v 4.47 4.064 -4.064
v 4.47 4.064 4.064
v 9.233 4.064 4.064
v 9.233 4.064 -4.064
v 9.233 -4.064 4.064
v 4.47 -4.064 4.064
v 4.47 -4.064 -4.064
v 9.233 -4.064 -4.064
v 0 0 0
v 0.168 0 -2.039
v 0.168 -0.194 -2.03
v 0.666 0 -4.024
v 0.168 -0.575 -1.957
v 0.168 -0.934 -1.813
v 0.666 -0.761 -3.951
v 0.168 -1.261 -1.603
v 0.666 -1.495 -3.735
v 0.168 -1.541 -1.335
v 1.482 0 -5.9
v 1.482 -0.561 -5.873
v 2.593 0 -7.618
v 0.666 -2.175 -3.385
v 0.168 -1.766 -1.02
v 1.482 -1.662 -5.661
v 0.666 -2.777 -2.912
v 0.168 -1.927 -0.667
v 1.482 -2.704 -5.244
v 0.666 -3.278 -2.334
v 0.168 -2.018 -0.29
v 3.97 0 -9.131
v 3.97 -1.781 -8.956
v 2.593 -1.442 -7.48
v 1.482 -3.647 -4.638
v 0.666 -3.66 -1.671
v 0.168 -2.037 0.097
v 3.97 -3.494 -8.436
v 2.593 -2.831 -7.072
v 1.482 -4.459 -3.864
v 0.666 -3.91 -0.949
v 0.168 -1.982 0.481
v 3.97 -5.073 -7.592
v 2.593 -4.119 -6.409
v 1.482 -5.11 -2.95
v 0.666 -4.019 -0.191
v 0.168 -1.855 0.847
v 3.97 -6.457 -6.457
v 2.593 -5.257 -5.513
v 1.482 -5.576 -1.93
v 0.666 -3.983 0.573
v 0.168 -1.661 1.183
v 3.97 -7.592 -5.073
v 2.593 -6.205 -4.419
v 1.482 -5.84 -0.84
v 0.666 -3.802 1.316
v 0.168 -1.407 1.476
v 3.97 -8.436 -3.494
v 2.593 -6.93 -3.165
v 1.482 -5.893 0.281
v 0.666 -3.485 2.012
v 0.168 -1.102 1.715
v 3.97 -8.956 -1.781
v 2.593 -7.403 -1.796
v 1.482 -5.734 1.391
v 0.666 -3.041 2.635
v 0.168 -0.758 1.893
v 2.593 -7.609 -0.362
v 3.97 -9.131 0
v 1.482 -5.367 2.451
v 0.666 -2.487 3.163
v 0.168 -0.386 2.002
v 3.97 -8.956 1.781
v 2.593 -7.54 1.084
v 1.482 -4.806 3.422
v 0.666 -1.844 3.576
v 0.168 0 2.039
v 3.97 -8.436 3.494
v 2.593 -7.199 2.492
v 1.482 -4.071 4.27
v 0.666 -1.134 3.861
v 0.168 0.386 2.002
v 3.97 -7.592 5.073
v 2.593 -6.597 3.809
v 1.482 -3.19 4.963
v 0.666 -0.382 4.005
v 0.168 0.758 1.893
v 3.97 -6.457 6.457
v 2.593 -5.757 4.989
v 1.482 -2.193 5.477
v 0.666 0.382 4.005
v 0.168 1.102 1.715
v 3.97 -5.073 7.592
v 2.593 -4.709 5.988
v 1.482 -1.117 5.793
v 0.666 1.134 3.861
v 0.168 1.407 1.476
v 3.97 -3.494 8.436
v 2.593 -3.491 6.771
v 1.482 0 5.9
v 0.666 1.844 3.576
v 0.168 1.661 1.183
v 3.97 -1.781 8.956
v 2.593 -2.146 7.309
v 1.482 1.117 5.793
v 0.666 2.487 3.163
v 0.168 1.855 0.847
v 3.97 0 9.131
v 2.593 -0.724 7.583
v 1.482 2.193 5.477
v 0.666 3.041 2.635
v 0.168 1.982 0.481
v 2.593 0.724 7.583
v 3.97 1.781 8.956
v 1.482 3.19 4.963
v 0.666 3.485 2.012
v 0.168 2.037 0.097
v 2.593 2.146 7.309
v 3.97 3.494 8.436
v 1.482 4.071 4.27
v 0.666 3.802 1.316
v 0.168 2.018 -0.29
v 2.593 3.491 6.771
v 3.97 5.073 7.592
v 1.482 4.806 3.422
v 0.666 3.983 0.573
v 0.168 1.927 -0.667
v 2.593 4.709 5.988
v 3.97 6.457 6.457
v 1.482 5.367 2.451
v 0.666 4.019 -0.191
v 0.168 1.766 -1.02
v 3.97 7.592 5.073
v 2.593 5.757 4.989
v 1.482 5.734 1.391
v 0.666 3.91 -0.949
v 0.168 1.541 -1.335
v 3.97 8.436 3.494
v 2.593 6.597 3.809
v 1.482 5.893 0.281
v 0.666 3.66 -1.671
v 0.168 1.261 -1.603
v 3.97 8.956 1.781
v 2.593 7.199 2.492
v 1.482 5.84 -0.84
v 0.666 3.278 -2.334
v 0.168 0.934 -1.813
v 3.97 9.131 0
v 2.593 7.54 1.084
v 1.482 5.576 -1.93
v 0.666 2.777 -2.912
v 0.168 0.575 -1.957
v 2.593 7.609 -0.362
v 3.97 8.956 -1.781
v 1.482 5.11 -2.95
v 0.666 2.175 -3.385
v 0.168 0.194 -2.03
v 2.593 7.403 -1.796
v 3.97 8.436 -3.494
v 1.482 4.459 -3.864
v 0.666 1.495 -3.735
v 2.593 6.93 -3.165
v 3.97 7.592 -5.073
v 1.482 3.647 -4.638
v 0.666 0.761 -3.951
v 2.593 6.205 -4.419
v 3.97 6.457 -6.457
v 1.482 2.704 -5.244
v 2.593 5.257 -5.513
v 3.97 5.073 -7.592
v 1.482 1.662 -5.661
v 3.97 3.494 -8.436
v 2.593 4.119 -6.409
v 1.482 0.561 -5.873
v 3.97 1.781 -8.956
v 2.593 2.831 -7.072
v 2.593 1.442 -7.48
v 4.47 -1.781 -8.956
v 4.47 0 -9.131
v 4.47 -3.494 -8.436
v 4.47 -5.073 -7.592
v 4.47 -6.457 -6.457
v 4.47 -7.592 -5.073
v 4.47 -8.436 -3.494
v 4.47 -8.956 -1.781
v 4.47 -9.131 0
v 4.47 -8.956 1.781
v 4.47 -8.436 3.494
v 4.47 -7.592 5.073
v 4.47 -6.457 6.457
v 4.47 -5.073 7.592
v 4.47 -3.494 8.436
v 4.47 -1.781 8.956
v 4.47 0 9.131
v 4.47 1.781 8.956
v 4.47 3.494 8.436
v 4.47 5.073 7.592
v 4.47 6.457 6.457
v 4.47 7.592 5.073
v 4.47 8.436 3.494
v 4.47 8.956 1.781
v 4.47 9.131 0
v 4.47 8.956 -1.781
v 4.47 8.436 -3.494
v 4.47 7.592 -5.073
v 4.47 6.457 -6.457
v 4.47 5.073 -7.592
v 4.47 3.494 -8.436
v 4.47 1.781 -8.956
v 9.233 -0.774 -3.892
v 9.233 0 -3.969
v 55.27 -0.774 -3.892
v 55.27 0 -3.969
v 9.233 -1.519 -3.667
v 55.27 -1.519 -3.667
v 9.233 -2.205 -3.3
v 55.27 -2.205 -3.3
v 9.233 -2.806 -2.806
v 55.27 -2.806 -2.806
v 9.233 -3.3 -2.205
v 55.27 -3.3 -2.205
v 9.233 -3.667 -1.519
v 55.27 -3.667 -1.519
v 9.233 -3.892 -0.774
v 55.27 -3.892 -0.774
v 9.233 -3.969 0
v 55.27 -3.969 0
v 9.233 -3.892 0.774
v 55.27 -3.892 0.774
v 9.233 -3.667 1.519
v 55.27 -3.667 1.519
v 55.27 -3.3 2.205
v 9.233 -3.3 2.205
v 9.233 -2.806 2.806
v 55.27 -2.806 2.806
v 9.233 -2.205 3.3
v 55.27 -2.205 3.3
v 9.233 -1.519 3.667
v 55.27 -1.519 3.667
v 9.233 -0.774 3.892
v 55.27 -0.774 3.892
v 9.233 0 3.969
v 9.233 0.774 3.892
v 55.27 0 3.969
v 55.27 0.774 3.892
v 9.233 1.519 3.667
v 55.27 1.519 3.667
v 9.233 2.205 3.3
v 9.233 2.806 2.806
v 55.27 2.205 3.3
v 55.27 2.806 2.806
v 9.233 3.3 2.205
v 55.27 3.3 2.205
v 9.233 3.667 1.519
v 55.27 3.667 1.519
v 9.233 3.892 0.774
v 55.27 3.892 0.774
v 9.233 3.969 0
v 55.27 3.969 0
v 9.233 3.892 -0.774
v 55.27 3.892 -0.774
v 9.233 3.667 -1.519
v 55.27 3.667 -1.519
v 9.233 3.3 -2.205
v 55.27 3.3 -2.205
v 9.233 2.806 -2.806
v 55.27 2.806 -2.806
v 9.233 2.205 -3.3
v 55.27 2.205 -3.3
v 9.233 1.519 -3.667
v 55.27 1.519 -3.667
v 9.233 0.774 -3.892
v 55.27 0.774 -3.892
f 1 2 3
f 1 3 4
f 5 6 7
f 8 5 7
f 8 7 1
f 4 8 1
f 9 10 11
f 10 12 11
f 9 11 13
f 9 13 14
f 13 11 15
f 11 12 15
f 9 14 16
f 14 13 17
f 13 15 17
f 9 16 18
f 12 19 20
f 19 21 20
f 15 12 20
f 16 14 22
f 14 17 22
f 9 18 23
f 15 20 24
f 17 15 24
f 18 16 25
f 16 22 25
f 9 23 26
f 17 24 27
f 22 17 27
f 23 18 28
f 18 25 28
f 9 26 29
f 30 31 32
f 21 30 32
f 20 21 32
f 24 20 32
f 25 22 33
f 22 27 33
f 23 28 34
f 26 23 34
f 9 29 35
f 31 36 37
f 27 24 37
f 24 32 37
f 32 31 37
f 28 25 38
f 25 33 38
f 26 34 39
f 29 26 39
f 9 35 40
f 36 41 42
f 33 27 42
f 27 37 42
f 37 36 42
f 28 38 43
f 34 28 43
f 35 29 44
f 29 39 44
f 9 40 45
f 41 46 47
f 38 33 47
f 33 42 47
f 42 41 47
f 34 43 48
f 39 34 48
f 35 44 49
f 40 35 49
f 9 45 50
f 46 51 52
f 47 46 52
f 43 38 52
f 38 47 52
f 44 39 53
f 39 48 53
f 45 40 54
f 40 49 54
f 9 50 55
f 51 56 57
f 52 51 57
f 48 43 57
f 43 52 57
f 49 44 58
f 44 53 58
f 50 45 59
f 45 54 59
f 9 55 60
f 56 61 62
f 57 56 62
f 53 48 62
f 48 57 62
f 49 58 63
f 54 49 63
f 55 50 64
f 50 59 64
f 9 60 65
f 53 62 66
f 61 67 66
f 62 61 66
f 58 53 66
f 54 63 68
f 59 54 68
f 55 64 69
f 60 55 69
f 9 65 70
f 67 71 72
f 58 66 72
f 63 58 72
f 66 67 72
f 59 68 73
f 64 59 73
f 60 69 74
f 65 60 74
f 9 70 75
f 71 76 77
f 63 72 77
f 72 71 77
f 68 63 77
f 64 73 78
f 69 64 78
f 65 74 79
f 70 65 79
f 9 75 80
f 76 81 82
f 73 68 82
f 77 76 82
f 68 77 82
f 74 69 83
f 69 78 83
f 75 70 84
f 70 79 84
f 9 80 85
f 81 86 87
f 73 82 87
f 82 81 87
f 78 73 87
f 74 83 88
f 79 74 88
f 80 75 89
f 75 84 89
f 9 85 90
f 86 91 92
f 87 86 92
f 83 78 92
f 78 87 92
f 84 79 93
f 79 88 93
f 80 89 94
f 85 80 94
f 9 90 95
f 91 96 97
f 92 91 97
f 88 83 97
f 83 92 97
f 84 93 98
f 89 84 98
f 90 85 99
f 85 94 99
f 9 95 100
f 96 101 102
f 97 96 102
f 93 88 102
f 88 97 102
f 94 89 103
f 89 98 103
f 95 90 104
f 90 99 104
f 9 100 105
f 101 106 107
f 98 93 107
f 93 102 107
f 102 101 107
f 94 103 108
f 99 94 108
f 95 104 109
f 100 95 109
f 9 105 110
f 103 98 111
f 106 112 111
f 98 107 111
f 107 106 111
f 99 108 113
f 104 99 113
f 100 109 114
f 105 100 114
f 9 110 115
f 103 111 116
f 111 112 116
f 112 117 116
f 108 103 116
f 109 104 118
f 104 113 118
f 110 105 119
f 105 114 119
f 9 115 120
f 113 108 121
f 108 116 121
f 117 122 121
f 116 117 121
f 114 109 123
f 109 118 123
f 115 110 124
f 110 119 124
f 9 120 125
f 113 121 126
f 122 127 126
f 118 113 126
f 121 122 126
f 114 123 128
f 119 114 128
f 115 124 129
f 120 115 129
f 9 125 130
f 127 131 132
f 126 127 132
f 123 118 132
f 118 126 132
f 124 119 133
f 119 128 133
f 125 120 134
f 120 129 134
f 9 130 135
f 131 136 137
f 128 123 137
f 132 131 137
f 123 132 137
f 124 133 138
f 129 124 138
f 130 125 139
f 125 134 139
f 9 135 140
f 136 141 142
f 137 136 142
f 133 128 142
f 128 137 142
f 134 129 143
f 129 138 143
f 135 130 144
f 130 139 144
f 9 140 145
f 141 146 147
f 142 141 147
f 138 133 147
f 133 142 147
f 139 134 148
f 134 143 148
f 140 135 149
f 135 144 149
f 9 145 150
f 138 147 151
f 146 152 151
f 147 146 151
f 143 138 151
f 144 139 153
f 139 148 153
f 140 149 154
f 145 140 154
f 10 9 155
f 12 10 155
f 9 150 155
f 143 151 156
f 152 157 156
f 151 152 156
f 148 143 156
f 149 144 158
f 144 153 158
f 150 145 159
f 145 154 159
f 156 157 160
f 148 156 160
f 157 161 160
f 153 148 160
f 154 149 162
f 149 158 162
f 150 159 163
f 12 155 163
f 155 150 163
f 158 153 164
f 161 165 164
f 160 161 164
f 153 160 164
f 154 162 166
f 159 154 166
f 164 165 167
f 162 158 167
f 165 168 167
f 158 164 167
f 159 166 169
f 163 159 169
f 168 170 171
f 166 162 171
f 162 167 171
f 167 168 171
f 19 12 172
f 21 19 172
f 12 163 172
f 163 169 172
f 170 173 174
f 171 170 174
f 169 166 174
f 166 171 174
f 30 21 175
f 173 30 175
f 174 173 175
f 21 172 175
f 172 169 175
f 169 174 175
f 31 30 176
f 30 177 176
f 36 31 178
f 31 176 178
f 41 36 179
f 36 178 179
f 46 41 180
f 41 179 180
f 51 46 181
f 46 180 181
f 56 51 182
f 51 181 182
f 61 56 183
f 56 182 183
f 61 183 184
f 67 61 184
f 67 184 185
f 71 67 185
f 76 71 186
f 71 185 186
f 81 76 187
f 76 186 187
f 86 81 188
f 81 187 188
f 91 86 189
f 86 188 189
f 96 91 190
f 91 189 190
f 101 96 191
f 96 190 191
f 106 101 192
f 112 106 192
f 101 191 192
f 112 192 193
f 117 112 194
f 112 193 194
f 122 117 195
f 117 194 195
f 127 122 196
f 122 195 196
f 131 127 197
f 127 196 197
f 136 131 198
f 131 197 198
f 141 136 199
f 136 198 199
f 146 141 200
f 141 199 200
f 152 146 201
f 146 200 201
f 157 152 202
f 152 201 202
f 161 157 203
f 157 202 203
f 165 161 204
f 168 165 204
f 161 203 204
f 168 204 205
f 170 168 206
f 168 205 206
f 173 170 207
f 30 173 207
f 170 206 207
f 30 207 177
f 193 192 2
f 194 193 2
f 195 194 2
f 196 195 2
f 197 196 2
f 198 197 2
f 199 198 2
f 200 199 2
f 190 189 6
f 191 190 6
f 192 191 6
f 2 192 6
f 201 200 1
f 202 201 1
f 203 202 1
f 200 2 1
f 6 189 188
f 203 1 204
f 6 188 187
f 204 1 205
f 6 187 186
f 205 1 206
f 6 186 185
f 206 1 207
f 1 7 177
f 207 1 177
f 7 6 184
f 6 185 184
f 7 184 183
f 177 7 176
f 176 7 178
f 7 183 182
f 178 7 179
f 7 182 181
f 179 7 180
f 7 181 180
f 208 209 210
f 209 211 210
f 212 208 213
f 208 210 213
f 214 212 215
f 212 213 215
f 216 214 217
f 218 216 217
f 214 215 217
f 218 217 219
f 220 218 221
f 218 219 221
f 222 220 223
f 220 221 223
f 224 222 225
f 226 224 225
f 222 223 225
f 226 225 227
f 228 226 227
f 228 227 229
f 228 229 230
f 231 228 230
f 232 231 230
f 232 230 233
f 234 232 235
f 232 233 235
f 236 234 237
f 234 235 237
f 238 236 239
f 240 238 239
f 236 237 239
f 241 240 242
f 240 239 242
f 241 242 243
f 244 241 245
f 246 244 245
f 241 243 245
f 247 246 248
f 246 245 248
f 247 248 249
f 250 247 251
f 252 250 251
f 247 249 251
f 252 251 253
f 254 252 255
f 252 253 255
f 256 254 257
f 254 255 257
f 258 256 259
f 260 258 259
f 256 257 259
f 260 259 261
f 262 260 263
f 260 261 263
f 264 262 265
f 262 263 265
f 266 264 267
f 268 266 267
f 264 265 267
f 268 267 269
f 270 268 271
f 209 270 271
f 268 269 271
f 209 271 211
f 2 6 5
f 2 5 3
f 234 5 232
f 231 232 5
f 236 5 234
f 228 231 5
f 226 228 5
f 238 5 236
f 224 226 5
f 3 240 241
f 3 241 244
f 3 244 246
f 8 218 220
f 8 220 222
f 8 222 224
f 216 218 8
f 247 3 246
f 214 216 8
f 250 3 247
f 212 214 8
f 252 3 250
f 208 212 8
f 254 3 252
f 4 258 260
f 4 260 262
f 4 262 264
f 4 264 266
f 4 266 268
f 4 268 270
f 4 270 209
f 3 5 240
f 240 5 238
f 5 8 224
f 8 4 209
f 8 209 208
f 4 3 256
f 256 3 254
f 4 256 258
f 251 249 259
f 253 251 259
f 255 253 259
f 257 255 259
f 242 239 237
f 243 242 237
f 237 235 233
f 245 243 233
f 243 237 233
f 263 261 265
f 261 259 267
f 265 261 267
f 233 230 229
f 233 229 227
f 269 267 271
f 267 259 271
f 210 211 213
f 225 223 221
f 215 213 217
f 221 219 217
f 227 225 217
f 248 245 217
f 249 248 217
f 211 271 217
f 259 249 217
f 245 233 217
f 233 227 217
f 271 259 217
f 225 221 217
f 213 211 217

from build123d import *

# Parameters (mm, degrees)
SKETCH2_W           = 8.128
SKETCH2_H           = 8.128
BOSS_EXTRUDE1_DEPTH = 4.7625


with BuildPart() as part:
    # Sketch1 → Revolve1 (revolve)
    with BuildSketch(Plane.XY, mode=Mode.PRIVATE) as revolve1_sk:
        with BuildLine():
            Line((3.9704, 9.1313), (4.4704, 9.1313))
            Line((4.4704, 9.1313), (4.4704, 3.81))
            Line((4.4704, 3.81), (9.2329, 3.81))
            Line((9.2329, 3.81), (9.2329, 3.96875))
            Line((9.2329, 3.96875), (55.2704, 3.96875))
            Line((55.2704, 3.96875), (55.2704, 0))
            Line((55.2704, 0), (0, 0))
            ThreePointArc((0, 0), (1.035543925, 4.97857198), (3.9704, 9.1313))
        make_face()
    revolve(revolve1_sk.sketch.rotate(Axis((0, 0, 0), (-1, 0, 0)), 90), axis=Axis((0, 0, 0), (-1, 0, 0)))

    # Sketch2 → Boss-Extrude1 (add)
    with BuildSketch(Plane(origin=(4.4704, 0, 0), x_dir=(0, 0, -1), z_dir=(1, 0, 0))):
        Rectangle(SKETCH2_W, SKETCH2_H)
    extrude(amount=BOSS_EXTRUDE1_DEPTH)


solid = part.part
